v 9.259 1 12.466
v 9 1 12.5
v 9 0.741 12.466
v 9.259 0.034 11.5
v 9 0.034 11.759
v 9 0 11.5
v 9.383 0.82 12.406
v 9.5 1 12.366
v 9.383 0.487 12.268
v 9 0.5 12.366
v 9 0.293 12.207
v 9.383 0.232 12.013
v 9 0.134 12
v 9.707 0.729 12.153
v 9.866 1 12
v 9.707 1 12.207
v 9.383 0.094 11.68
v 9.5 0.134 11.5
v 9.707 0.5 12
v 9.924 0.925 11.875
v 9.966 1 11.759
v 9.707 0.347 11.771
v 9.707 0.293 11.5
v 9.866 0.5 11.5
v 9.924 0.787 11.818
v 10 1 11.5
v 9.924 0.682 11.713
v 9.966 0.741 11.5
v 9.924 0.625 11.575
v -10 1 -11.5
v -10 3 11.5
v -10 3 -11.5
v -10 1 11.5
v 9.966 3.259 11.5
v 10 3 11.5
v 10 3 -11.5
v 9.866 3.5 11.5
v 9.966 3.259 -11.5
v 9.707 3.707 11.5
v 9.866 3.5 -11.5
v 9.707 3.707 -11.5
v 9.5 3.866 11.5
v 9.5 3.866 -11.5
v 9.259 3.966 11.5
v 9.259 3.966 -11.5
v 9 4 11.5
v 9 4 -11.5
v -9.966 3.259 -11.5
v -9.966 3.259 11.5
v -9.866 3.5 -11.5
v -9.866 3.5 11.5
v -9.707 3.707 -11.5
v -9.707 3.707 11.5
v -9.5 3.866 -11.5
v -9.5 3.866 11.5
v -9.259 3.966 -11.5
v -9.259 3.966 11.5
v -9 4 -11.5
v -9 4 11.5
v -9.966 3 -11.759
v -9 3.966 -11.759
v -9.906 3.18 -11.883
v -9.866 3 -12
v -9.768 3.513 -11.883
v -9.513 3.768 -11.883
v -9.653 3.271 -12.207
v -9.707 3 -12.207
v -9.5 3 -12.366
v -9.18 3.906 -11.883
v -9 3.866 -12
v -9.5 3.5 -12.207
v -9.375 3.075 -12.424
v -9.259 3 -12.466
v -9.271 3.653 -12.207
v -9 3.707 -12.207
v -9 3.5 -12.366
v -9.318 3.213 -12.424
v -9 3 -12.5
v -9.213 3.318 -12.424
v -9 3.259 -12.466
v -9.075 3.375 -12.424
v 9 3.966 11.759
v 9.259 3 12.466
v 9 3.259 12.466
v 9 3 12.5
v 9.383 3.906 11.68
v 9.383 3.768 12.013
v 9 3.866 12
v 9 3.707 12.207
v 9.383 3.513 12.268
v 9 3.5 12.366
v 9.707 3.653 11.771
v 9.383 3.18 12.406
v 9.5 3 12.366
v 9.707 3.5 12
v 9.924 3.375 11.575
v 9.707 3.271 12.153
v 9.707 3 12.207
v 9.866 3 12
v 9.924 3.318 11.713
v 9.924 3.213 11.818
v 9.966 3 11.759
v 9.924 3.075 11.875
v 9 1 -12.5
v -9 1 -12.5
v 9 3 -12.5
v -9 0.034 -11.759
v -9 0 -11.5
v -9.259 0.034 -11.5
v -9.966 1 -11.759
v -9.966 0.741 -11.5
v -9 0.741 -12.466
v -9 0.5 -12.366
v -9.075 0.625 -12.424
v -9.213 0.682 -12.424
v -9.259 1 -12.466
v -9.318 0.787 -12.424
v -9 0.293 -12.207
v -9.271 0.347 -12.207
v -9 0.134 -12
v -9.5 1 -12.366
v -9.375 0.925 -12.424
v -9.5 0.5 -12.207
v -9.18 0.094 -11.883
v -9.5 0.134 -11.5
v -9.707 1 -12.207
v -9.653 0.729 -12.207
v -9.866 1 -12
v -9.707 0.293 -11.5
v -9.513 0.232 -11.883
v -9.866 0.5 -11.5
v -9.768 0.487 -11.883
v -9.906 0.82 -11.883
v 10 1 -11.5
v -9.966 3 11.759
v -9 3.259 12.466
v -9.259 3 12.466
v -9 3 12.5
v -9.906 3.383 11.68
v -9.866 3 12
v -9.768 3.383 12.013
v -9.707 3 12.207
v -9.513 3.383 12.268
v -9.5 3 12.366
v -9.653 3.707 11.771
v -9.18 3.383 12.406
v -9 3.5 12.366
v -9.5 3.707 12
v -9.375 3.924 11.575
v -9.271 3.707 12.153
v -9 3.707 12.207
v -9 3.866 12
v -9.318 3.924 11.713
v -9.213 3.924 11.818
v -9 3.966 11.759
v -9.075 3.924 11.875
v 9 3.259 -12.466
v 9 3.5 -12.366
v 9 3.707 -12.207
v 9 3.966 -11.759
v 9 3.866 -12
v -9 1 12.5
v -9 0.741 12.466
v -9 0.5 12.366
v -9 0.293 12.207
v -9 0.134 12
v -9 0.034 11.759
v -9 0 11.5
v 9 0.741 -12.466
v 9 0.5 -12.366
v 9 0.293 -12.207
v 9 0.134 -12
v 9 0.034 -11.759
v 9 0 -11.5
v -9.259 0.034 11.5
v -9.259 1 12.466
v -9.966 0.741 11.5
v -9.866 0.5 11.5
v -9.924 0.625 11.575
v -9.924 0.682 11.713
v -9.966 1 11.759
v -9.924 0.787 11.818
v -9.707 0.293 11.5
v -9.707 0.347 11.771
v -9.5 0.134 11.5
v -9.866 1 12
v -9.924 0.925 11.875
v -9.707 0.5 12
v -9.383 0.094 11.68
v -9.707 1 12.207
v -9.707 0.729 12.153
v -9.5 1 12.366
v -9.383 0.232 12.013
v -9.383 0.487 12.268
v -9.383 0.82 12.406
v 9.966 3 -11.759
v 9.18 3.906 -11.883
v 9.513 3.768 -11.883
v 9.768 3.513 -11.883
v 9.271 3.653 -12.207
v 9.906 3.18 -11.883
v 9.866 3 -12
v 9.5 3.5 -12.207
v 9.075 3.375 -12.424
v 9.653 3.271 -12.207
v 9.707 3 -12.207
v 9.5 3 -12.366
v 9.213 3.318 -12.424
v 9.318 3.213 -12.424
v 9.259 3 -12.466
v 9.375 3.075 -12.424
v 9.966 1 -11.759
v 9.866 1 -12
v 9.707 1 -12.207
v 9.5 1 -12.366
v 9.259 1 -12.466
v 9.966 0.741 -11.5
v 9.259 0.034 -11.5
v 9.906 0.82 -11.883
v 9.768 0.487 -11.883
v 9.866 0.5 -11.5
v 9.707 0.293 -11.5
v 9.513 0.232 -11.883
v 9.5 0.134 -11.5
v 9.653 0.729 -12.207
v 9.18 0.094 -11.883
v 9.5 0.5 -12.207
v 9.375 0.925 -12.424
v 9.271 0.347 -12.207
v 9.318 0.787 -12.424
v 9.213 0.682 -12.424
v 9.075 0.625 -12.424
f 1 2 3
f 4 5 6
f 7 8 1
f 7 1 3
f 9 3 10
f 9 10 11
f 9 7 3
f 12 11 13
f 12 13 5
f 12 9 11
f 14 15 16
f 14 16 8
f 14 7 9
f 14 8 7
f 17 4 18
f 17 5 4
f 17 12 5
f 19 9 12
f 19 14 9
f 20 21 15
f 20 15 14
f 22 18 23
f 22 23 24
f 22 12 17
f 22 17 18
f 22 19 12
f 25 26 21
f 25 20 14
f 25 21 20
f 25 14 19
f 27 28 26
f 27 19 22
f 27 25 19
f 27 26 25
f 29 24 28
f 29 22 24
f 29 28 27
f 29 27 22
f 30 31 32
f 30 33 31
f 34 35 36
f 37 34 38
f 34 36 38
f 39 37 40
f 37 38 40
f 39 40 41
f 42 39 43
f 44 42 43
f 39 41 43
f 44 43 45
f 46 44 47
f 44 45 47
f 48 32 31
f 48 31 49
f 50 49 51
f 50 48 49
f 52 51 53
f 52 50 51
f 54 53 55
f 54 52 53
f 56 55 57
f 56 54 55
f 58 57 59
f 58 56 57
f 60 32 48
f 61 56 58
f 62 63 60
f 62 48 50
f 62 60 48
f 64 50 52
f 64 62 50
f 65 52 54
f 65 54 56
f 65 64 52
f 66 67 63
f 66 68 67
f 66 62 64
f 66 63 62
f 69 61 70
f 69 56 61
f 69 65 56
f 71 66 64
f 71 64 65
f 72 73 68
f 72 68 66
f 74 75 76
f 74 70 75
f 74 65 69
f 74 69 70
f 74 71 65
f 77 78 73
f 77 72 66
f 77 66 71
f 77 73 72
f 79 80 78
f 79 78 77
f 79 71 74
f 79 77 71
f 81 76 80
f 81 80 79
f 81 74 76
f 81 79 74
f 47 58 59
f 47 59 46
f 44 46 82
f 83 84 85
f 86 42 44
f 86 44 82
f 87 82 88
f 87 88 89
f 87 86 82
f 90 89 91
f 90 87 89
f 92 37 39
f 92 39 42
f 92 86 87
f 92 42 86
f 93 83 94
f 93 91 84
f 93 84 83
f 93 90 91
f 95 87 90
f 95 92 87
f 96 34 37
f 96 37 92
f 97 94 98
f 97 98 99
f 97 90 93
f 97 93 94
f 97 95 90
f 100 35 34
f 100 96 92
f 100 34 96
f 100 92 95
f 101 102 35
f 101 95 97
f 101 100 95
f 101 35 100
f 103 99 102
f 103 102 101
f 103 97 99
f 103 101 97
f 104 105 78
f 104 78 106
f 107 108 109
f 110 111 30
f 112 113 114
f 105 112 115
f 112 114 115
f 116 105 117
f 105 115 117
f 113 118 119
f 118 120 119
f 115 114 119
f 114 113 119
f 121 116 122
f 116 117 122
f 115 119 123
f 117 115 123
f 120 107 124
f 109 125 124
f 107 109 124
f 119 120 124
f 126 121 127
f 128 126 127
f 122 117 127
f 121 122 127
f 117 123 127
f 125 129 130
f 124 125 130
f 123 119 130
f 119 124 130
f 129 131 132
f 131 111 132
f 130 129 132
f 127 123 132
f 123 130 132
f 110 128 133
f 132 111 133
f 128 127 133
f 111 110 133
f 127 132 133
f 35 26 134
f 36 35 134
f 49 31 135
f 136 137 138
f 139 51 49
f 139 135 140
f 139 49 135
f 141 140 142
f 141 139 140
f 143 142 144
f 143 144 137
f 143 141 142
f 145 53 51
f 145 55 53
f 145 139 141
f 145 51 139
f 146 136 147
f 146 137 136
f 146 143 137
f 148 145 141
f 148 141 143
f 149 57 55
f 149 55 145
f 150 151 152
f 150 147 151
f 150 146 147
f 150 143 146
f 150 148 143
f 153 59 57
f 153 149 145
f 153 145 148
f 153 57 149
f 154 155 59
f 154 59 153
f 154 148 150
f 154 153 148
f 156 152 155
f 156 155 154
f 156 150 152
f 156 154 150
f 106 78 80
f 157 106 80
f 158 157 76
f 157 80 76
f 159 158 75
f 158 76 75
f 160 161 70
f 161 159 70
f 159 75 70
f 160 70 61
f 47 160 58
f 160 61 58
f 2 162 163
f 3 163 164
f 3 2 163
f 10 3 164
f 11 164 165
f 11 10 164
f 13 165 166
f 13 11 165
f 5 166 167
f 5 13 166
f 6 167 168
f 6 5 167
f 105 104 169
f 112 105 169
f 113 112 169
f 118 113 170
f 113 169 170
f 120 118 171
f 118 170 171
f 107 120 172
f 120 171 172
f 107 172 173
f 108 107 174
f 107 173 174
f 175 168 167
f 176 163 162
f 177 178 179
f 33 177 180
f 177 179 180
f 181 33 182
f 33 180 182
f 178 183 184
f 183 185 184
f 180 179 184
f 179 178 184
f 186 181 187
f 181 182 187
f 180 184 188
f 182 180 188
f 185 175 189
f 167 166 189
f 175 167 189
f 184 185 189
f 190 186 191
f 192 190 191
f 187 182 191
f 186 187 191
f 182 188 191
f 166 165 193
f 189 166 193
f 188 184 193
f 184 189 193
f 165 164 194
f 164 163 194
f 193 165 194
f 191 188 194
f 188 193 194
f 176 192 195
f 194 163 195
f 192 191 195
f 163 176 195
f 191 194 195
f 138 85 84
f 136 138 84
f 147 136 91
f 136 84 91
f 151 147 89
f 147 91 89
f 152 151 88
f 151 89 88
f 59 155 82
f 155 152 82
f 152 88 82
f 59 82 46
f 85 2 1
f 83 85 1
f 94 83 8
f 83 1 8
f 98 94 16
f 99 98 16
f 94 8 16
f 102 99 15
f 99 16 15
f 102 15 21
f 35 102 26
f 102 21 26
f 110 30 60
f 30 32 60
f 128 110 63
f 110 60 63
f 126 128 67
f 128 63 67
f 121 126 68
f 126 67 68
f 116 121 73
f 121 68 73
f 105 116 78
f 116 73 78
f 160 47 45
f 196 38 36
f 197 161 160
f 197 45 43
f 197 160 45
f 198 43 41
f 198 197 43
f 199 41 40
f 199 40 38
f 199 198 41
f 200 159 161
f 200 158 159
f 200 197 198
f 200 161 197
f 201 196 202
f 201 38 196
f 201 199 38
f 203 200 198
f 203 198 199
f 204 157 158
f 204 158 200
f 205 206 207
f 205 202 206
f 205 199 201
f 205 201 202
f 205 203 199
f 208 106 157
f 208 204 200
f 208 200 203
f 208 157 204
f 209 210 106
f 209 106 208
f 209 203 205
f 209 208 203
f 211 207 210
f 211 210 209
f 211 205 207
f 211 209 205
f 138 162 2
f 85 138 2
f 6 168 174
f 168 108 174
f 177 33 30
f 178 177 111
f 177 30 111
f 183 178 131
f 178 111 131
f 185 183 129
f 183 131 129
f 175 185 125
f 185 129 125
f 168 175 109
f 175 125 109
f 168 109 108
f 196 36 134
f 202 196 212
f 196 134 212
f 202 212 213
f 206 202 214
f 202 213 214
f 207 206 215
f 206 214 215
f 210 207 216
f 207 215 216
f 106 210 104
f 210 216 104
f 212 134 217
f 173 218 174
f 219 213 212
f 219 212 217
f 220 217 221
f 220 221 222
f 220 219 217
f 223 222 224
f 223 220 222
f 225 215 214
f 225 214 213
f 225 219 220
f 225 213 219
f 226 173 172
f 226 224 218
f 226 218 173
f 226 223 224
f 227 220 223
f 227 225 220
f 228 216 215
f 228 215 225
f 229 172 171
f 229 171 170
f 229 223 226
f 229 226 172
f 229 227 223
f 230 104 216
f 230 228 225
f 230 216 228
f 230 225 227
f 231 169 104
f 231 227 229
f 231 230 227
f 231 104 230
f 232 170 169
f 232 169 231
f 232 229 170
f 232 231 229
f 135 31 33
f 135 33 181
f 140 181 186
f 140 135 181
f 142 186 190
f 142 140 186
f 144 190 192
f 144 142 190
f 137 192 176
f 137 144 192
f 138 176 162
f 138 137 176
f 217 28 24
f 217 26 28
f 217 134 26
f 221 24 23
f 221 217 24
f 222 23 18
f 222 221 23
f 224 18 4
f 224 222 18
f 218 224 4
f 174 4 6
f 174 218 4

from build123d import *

# Parameters (mm, degrees)
SKETCH_1_W      = 20
SKETCH_1_H      = 25
EXTRUDE_1_DEPTH = 4
FILLET_2_R      = 1
FILLET_3_R      = 1


with BuildPart() as part:
    # 草图1 → 凸台-拉伸1 (new body)
    with BuildSketch(Plane(origin=(0, 0, 0), x_dir=(1, 0, 0), z_dir=(0, 1, 0))):
        Rectangle(SKETCH_1_W, SKETCH_1_H)
    extrude(amount=EXTRUDE_1_DEPTH)

    # 圆角2
    fillet_2_edges = [part.edges().sort_by_distance(p)[0] for p in [
        (-10, 4, 0),
        (0, 0, 12.5),
        (-10, 0, 0),
        (0, 0, -12.5),
        (10, 0, 0),
        (-10, 2, 12.5),
        (-10, 2, -12.5),
    ]]
    fillet(fillet_2_edges, radius=FILLET_2_R)

    # 圆角3
    # the kernel refuses this fillet: 1 mm, written as the material it takes off along each edge
    with BuildSketch(Plane(origin=(-9, 3, 11.5), x_dir=(0, 0, 1), z_dir=(0, 1, 0))) as fillet_3_piece_1_section:
        Polygon((0, 0), (FILLET_3_R, 0), (FILLET_3_R, -FILLET_3_R), (0, -FILLET_3_R), align=None)
    fillet_3_piece_1 = extrude(amount=FILLET_3_R, mode=Mode.PRIVATE)
    fillet_3_piece_1 = fillet_3_piece_1 - Plane(origin=(-9, 3, 11.5), x_dir=(0.7071067811865475, 0, -0.7071067811865477), z_dir=(0, 1, 0)) * Sphere(FILLET_3_R, mode=Mode.PRIVATE)
    add(fillet_3_piece_1, mode=Mode.SUBTRACT)
    with BuildSketch(Plane(origin=(-9, 3, -11.5), x_dir=(0, 1, 0), z_dir=(0, 0, -1))) as fillet_3_piece_2_section:
        Polygon((0, 0), (FILLET_3_R, 0), (FILLET_3_R, -FILLET_3_R), (0, -FILLET_3_R), align=None)
    fillet_3_piece_2 = extrude(amount=FILLET_3_R, mode=Mode.PRIVATE)
    fillet_3_piece_2 = fillet_3_piece_2 - Plane(origin=(-9, 3, -11.5), x_dir=(0.7071067811865475, -0.7071067811865475, 0), z_dir=(0, 0, -1)) * Sphere(FILLET_3_R, mode=Mode.PRIVATE)
    add(fillet_3_piece_2, mode=Mode.SUBTRACT)
    with BuildSketch(Plane(origin=(9, 1, 11.5), x_dir=(0, 0, 1), z_dir=(1, 0, 0))) as fillet_3_piece_3_section:
        Polygon((0, 0), (FILLET_3_R, 0), (FILLET_3_R, FILLET_3_R), (0, FILLET_3_R), align=None)
    fillet_3_piece_3 = extrude(amount=FILLET_3_R, mode=Mode.PRIVATE)
    fillet_3_piece_3 = fillet_3_piece_3 - Plane(origin=(9, 1, 11.5), x_dir=(0, 0.7071067811865475, -0.7071067811865475), z_dir=(1, 0, 0)) * Sphere(FILLET_3_R, mode=Mode.PRIVATE)
    add(fillet_3_piece_3, mode=Mode.SUBTRACT)
    with BuildSketch(Plane(origin=(9, 1, -11.5), x_dir=(1, 0, 0), z_dir=(0, 0, -1))) as fillet_3_piece_4_section:
        Polygon((0, 0), (FILLET_3_R, 0), (FILLET_3_R, FILLET_3_R), (0, FILLET_3_R), align=None)
    fillet_3_piece_4 = extrude(amount=FILLET_3_R, mode=Mode.PRIVATE)
    fillet_3_piece_4 = fillet_3_piece_4 - Plane(origin=(9, 1, -11.5), x_dir=(-0.7071067811865475, 0.7071067811865475, 0), z_dir=(0, 0, -1)) * Sphere(FILLET_3_R, mode=Mode.PRIVATE)
    add(fillet_3_piece_4, mode=Mode.SUBTRACT)
    with BuildSketch(Plane(origin=(9, 3, 11.5), x_dir=(0, 1, 0), z_dir=(1, 0, 0))) as fillet_3_piece_5_section:
        Polygon((0, 0), (FILLET_3_R, 0), (FILLET_3_R, FILLET_3_R), (0, FILLET_3_R), align=None)
    fillet_3_piece_5 = extrude(amount=FILLET_3_R, mode=Mode.PRIVATE)
    fillet_3_piece_5 = fillet_3_piece_5 - Plane(origin=(9, 3, 11.5), x_dir=(0, -0.7071067811865475, -0.7071067811865475), z_dir=(1, 0, 0)) * Sphere(FILLET_3_R, mode=Mode.PRIVATE)
    add(fillet_3_piece_5, mode=Mode.SUBTRACT)
    with BuildSketch(Plane(origin=(9, 3, -11.5), x_dir=(1, 0, 0), z_dir=(0, 0, -1))) as fillet_3_piece_6_section:
        Polygon((0, 0), (FILLET_3_R, 0), (FILLET_3_R, -FILLET_3_R), (0, -FILLET_3_R), align=None)
    fillet_3_piece_6 = extrude(amount=FILLET_3_R, mode=Mode.PRIVATE)
    fillet_3_piece_6 = fillet_3_piece_6 - Plane(origin=(9, 3, -11.5), x_dir=(-0.7071067811865475, -0.7071067811865475, 0), z_dir=(0, 0, -1)) * Sphere(FILLET_3_R, mode=Mode.PRIVATE)
    add(fillet_3_piece_6, mode=Mode.SUBTRACT)
    with BuildSketch(Plane(origin=(9, 4, 12.5), x_dir=(0, 0, -1), z_dir=(-1, 0, 0))) as fillet_3_piece_7:
        with BuildLine():
            CenterArc((FILLET_3_R, FILLET_3_R), FILLET_3_R, 180, 90)
            Line((0, FILLET_3_R), (0, 0))
            Line((0, 0), (FILLET_3_R, 0))
        make_face()
    extrude(amount=18, mode=Mode.SUBTRACT)
    with BuildSketch(Plane(origin=(10, 4, -11.5), x_dir=(0, -1, 0), z_dir=(0, 0, 1))) as fillet_3_piece_8:
        with BuildLine():
            CenterArc((FILLET_3_R, -FILLET_3_R), FILLET_3_R, 90, 90)
            Line((0, -FILLET_3_R), (0, 0))
            Line((0, 0), (FILLET_3_R, 0))
        make_face()
    extrude(amount=23, mode=Mode.SUBTRACT)
    with BuildSketch(Plane(origin=(-9, 4, -12.5), x_dir=(0, -1, 0), z_dir=(1, 0, 0))) as fillet_3_piece_9:
        with BuildLine():
            CenterArc((FILLET_3_R, -FILLET_3_R), FILLET_3_R, 90, 90)
            Line((0, -FILLET_3_R), (0, 0))
            Line((0, 0), (FILLET_3_R, 0))
        make_face()
    extrude(amount=18, mode=Mode.SUBTRACT)
    with BuildSketch(Plane(origin=(10, 1, 12.5), x_dir=(0, 0, -1), z_dir=(0, 1, 0)), Plane(origin=(10, 1, -12.5), x_dir=(-1, 0, 0), z_dir=(0, 1, 0))) as fillet_3_piece_10:
        with BuildLine():
            CenterArc((FILLET_3_R, FILLET_3_R), FILLET_3_R, 180, 90)
            Line((0, FILLET_3_R), (0, 0))
            Line((0, 0), (FILLET_3_R, 0))
        make_face()
    extrude(amount=2, mode=Mode.SUBTRACT)


solid = part.part
